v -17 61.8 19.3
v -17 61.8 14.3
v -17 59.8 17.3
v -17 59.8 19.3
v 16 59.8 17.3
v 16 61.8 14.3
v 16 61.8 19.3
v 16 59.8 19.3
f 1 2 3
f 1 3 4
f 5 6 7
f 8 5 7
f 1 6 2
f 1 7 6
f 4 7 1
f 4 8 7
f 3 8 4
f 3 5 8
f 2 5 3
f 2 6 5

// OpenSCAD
th = 10;
//d = 2;
//cube([121.6+th,63+th,9.9+d]);
scale=1;
dist=1;
//points=[1,1,1,1,1,1,1,1,1,.99,.97,.95,.92,.8,0];


points=[0,.92,.95,.97,.99,1,1,1,1,1,1,1,1,1,1];

points2=[0,.8,.99,1];


//number of points
num_points = len(points);
num_points2 = len(points2);
twist = 0;

w=64;
h=121.6;
//d=9.9;
d = 15;

h_mm = 5;
w_mm = 5;
d_mm = 4;

w_s = (w+w_mm)/w;
h_s = (h+h_mm)/h;
d_s = (d+d_mm)/d;


module extrude()
{
  for(i=[1:num_points])
  {
  translate([0,0,(i-1)*dist])
  
  linear_extrude(height=dist, twist=twist/num_points, scale=points[i]/points[i-1])
  //translate([-50,-50,0])
  //import("ornament.dxf");
  rotate(-twist*i/num_points)
  //square(scale*points[i-1], center=true);
  scale(scale*points[i-1])
  thing();
  }
}

module extrude2()
{
  for(i=[1:num_points2])
  {
  translate([0,0,(i-1)*dist])
  
  linear_extrude(height=dist, twist=twist/num_points2, scale=points2[i]/points2[i-1])
  //translate([-50,-50,0])
  //import("ornament.dxf");
  rotate(-twist*i/num_points2)
  //square(scale*points[i-1], center=true);
  scale(scale*points2[i-1])
  thing();
  }
}

module thing()
{
//rotate([0,0,90])
translate([-63/2,-121.6/2,0])
//linear_extrude(height=3, scale=1)
  import(file="s3mini.dxf", center=true);
}


/*

translate([0,0,2+10])
mirror([0,0,1])
difference()
{
//translate([-121.6/2,0,0])
//cube([121.6+th,63+th,9.9+d]);

scale([1.06,1.1,1.2])
translate([0,0,2])
extrude();
union()
{


translate([-121/2+15,-10,-10])
cube([30,20,30]);



scale([3,3,1])
translate([-121.6/2,-63/2,17])
cube([121.6,63,9.9]);


scale(1.01)
extrude();


translate([0,-10,-3])
{
  cylinder(r=3,h=20,$fn=40);
  cylinder(r=5,h=14,$fn=40);
}

translate([0,10,-3]){
  cylinder(r=3,h=20,$fn=40);
  cylinder(r=5,h=14,$fn=40);
}
}

}
*/


/*
translate([0,0,10])
linear_extrude(height=dist, twist=twist/num_points, scale=points[i]/points[i-1])
thing();
*/
scale(1.015)
{
difference()
{
translate([0,0,0])
scale([w_s,h_s,d_s])
extrude()
thing();


union()
{
translate([-7.5,h/2-20-30-h_mm,-10])
cube([15,30,30]);



translate([0, 0, d_mm])
scale([1,1,d_s])
extrude()
thing();


translate([w/4,h/2-30+5,0])
cube([2,30,d*2]);

translate([-w/4-3.5,h/2-30+5,0])
cube([2,30,d*2]);

}

}



difference()
{
translate([0,0,22])
//scale([w_s,h_s,1])

rotate([180,0,0])
extrude2();

translate([-100, -h/2+10, 0])
cube([200,200,50]);
}
}



/*
translate([0,0,7])
linear_extrude(height=11)
thing();
*/

translate([-w/4-1,h/2-1,19.3])
rotate([0,90,0])
linear_extrude(height=33)
polygon(points=[[0,0],[0,2],[5,2],[2,0]]);
